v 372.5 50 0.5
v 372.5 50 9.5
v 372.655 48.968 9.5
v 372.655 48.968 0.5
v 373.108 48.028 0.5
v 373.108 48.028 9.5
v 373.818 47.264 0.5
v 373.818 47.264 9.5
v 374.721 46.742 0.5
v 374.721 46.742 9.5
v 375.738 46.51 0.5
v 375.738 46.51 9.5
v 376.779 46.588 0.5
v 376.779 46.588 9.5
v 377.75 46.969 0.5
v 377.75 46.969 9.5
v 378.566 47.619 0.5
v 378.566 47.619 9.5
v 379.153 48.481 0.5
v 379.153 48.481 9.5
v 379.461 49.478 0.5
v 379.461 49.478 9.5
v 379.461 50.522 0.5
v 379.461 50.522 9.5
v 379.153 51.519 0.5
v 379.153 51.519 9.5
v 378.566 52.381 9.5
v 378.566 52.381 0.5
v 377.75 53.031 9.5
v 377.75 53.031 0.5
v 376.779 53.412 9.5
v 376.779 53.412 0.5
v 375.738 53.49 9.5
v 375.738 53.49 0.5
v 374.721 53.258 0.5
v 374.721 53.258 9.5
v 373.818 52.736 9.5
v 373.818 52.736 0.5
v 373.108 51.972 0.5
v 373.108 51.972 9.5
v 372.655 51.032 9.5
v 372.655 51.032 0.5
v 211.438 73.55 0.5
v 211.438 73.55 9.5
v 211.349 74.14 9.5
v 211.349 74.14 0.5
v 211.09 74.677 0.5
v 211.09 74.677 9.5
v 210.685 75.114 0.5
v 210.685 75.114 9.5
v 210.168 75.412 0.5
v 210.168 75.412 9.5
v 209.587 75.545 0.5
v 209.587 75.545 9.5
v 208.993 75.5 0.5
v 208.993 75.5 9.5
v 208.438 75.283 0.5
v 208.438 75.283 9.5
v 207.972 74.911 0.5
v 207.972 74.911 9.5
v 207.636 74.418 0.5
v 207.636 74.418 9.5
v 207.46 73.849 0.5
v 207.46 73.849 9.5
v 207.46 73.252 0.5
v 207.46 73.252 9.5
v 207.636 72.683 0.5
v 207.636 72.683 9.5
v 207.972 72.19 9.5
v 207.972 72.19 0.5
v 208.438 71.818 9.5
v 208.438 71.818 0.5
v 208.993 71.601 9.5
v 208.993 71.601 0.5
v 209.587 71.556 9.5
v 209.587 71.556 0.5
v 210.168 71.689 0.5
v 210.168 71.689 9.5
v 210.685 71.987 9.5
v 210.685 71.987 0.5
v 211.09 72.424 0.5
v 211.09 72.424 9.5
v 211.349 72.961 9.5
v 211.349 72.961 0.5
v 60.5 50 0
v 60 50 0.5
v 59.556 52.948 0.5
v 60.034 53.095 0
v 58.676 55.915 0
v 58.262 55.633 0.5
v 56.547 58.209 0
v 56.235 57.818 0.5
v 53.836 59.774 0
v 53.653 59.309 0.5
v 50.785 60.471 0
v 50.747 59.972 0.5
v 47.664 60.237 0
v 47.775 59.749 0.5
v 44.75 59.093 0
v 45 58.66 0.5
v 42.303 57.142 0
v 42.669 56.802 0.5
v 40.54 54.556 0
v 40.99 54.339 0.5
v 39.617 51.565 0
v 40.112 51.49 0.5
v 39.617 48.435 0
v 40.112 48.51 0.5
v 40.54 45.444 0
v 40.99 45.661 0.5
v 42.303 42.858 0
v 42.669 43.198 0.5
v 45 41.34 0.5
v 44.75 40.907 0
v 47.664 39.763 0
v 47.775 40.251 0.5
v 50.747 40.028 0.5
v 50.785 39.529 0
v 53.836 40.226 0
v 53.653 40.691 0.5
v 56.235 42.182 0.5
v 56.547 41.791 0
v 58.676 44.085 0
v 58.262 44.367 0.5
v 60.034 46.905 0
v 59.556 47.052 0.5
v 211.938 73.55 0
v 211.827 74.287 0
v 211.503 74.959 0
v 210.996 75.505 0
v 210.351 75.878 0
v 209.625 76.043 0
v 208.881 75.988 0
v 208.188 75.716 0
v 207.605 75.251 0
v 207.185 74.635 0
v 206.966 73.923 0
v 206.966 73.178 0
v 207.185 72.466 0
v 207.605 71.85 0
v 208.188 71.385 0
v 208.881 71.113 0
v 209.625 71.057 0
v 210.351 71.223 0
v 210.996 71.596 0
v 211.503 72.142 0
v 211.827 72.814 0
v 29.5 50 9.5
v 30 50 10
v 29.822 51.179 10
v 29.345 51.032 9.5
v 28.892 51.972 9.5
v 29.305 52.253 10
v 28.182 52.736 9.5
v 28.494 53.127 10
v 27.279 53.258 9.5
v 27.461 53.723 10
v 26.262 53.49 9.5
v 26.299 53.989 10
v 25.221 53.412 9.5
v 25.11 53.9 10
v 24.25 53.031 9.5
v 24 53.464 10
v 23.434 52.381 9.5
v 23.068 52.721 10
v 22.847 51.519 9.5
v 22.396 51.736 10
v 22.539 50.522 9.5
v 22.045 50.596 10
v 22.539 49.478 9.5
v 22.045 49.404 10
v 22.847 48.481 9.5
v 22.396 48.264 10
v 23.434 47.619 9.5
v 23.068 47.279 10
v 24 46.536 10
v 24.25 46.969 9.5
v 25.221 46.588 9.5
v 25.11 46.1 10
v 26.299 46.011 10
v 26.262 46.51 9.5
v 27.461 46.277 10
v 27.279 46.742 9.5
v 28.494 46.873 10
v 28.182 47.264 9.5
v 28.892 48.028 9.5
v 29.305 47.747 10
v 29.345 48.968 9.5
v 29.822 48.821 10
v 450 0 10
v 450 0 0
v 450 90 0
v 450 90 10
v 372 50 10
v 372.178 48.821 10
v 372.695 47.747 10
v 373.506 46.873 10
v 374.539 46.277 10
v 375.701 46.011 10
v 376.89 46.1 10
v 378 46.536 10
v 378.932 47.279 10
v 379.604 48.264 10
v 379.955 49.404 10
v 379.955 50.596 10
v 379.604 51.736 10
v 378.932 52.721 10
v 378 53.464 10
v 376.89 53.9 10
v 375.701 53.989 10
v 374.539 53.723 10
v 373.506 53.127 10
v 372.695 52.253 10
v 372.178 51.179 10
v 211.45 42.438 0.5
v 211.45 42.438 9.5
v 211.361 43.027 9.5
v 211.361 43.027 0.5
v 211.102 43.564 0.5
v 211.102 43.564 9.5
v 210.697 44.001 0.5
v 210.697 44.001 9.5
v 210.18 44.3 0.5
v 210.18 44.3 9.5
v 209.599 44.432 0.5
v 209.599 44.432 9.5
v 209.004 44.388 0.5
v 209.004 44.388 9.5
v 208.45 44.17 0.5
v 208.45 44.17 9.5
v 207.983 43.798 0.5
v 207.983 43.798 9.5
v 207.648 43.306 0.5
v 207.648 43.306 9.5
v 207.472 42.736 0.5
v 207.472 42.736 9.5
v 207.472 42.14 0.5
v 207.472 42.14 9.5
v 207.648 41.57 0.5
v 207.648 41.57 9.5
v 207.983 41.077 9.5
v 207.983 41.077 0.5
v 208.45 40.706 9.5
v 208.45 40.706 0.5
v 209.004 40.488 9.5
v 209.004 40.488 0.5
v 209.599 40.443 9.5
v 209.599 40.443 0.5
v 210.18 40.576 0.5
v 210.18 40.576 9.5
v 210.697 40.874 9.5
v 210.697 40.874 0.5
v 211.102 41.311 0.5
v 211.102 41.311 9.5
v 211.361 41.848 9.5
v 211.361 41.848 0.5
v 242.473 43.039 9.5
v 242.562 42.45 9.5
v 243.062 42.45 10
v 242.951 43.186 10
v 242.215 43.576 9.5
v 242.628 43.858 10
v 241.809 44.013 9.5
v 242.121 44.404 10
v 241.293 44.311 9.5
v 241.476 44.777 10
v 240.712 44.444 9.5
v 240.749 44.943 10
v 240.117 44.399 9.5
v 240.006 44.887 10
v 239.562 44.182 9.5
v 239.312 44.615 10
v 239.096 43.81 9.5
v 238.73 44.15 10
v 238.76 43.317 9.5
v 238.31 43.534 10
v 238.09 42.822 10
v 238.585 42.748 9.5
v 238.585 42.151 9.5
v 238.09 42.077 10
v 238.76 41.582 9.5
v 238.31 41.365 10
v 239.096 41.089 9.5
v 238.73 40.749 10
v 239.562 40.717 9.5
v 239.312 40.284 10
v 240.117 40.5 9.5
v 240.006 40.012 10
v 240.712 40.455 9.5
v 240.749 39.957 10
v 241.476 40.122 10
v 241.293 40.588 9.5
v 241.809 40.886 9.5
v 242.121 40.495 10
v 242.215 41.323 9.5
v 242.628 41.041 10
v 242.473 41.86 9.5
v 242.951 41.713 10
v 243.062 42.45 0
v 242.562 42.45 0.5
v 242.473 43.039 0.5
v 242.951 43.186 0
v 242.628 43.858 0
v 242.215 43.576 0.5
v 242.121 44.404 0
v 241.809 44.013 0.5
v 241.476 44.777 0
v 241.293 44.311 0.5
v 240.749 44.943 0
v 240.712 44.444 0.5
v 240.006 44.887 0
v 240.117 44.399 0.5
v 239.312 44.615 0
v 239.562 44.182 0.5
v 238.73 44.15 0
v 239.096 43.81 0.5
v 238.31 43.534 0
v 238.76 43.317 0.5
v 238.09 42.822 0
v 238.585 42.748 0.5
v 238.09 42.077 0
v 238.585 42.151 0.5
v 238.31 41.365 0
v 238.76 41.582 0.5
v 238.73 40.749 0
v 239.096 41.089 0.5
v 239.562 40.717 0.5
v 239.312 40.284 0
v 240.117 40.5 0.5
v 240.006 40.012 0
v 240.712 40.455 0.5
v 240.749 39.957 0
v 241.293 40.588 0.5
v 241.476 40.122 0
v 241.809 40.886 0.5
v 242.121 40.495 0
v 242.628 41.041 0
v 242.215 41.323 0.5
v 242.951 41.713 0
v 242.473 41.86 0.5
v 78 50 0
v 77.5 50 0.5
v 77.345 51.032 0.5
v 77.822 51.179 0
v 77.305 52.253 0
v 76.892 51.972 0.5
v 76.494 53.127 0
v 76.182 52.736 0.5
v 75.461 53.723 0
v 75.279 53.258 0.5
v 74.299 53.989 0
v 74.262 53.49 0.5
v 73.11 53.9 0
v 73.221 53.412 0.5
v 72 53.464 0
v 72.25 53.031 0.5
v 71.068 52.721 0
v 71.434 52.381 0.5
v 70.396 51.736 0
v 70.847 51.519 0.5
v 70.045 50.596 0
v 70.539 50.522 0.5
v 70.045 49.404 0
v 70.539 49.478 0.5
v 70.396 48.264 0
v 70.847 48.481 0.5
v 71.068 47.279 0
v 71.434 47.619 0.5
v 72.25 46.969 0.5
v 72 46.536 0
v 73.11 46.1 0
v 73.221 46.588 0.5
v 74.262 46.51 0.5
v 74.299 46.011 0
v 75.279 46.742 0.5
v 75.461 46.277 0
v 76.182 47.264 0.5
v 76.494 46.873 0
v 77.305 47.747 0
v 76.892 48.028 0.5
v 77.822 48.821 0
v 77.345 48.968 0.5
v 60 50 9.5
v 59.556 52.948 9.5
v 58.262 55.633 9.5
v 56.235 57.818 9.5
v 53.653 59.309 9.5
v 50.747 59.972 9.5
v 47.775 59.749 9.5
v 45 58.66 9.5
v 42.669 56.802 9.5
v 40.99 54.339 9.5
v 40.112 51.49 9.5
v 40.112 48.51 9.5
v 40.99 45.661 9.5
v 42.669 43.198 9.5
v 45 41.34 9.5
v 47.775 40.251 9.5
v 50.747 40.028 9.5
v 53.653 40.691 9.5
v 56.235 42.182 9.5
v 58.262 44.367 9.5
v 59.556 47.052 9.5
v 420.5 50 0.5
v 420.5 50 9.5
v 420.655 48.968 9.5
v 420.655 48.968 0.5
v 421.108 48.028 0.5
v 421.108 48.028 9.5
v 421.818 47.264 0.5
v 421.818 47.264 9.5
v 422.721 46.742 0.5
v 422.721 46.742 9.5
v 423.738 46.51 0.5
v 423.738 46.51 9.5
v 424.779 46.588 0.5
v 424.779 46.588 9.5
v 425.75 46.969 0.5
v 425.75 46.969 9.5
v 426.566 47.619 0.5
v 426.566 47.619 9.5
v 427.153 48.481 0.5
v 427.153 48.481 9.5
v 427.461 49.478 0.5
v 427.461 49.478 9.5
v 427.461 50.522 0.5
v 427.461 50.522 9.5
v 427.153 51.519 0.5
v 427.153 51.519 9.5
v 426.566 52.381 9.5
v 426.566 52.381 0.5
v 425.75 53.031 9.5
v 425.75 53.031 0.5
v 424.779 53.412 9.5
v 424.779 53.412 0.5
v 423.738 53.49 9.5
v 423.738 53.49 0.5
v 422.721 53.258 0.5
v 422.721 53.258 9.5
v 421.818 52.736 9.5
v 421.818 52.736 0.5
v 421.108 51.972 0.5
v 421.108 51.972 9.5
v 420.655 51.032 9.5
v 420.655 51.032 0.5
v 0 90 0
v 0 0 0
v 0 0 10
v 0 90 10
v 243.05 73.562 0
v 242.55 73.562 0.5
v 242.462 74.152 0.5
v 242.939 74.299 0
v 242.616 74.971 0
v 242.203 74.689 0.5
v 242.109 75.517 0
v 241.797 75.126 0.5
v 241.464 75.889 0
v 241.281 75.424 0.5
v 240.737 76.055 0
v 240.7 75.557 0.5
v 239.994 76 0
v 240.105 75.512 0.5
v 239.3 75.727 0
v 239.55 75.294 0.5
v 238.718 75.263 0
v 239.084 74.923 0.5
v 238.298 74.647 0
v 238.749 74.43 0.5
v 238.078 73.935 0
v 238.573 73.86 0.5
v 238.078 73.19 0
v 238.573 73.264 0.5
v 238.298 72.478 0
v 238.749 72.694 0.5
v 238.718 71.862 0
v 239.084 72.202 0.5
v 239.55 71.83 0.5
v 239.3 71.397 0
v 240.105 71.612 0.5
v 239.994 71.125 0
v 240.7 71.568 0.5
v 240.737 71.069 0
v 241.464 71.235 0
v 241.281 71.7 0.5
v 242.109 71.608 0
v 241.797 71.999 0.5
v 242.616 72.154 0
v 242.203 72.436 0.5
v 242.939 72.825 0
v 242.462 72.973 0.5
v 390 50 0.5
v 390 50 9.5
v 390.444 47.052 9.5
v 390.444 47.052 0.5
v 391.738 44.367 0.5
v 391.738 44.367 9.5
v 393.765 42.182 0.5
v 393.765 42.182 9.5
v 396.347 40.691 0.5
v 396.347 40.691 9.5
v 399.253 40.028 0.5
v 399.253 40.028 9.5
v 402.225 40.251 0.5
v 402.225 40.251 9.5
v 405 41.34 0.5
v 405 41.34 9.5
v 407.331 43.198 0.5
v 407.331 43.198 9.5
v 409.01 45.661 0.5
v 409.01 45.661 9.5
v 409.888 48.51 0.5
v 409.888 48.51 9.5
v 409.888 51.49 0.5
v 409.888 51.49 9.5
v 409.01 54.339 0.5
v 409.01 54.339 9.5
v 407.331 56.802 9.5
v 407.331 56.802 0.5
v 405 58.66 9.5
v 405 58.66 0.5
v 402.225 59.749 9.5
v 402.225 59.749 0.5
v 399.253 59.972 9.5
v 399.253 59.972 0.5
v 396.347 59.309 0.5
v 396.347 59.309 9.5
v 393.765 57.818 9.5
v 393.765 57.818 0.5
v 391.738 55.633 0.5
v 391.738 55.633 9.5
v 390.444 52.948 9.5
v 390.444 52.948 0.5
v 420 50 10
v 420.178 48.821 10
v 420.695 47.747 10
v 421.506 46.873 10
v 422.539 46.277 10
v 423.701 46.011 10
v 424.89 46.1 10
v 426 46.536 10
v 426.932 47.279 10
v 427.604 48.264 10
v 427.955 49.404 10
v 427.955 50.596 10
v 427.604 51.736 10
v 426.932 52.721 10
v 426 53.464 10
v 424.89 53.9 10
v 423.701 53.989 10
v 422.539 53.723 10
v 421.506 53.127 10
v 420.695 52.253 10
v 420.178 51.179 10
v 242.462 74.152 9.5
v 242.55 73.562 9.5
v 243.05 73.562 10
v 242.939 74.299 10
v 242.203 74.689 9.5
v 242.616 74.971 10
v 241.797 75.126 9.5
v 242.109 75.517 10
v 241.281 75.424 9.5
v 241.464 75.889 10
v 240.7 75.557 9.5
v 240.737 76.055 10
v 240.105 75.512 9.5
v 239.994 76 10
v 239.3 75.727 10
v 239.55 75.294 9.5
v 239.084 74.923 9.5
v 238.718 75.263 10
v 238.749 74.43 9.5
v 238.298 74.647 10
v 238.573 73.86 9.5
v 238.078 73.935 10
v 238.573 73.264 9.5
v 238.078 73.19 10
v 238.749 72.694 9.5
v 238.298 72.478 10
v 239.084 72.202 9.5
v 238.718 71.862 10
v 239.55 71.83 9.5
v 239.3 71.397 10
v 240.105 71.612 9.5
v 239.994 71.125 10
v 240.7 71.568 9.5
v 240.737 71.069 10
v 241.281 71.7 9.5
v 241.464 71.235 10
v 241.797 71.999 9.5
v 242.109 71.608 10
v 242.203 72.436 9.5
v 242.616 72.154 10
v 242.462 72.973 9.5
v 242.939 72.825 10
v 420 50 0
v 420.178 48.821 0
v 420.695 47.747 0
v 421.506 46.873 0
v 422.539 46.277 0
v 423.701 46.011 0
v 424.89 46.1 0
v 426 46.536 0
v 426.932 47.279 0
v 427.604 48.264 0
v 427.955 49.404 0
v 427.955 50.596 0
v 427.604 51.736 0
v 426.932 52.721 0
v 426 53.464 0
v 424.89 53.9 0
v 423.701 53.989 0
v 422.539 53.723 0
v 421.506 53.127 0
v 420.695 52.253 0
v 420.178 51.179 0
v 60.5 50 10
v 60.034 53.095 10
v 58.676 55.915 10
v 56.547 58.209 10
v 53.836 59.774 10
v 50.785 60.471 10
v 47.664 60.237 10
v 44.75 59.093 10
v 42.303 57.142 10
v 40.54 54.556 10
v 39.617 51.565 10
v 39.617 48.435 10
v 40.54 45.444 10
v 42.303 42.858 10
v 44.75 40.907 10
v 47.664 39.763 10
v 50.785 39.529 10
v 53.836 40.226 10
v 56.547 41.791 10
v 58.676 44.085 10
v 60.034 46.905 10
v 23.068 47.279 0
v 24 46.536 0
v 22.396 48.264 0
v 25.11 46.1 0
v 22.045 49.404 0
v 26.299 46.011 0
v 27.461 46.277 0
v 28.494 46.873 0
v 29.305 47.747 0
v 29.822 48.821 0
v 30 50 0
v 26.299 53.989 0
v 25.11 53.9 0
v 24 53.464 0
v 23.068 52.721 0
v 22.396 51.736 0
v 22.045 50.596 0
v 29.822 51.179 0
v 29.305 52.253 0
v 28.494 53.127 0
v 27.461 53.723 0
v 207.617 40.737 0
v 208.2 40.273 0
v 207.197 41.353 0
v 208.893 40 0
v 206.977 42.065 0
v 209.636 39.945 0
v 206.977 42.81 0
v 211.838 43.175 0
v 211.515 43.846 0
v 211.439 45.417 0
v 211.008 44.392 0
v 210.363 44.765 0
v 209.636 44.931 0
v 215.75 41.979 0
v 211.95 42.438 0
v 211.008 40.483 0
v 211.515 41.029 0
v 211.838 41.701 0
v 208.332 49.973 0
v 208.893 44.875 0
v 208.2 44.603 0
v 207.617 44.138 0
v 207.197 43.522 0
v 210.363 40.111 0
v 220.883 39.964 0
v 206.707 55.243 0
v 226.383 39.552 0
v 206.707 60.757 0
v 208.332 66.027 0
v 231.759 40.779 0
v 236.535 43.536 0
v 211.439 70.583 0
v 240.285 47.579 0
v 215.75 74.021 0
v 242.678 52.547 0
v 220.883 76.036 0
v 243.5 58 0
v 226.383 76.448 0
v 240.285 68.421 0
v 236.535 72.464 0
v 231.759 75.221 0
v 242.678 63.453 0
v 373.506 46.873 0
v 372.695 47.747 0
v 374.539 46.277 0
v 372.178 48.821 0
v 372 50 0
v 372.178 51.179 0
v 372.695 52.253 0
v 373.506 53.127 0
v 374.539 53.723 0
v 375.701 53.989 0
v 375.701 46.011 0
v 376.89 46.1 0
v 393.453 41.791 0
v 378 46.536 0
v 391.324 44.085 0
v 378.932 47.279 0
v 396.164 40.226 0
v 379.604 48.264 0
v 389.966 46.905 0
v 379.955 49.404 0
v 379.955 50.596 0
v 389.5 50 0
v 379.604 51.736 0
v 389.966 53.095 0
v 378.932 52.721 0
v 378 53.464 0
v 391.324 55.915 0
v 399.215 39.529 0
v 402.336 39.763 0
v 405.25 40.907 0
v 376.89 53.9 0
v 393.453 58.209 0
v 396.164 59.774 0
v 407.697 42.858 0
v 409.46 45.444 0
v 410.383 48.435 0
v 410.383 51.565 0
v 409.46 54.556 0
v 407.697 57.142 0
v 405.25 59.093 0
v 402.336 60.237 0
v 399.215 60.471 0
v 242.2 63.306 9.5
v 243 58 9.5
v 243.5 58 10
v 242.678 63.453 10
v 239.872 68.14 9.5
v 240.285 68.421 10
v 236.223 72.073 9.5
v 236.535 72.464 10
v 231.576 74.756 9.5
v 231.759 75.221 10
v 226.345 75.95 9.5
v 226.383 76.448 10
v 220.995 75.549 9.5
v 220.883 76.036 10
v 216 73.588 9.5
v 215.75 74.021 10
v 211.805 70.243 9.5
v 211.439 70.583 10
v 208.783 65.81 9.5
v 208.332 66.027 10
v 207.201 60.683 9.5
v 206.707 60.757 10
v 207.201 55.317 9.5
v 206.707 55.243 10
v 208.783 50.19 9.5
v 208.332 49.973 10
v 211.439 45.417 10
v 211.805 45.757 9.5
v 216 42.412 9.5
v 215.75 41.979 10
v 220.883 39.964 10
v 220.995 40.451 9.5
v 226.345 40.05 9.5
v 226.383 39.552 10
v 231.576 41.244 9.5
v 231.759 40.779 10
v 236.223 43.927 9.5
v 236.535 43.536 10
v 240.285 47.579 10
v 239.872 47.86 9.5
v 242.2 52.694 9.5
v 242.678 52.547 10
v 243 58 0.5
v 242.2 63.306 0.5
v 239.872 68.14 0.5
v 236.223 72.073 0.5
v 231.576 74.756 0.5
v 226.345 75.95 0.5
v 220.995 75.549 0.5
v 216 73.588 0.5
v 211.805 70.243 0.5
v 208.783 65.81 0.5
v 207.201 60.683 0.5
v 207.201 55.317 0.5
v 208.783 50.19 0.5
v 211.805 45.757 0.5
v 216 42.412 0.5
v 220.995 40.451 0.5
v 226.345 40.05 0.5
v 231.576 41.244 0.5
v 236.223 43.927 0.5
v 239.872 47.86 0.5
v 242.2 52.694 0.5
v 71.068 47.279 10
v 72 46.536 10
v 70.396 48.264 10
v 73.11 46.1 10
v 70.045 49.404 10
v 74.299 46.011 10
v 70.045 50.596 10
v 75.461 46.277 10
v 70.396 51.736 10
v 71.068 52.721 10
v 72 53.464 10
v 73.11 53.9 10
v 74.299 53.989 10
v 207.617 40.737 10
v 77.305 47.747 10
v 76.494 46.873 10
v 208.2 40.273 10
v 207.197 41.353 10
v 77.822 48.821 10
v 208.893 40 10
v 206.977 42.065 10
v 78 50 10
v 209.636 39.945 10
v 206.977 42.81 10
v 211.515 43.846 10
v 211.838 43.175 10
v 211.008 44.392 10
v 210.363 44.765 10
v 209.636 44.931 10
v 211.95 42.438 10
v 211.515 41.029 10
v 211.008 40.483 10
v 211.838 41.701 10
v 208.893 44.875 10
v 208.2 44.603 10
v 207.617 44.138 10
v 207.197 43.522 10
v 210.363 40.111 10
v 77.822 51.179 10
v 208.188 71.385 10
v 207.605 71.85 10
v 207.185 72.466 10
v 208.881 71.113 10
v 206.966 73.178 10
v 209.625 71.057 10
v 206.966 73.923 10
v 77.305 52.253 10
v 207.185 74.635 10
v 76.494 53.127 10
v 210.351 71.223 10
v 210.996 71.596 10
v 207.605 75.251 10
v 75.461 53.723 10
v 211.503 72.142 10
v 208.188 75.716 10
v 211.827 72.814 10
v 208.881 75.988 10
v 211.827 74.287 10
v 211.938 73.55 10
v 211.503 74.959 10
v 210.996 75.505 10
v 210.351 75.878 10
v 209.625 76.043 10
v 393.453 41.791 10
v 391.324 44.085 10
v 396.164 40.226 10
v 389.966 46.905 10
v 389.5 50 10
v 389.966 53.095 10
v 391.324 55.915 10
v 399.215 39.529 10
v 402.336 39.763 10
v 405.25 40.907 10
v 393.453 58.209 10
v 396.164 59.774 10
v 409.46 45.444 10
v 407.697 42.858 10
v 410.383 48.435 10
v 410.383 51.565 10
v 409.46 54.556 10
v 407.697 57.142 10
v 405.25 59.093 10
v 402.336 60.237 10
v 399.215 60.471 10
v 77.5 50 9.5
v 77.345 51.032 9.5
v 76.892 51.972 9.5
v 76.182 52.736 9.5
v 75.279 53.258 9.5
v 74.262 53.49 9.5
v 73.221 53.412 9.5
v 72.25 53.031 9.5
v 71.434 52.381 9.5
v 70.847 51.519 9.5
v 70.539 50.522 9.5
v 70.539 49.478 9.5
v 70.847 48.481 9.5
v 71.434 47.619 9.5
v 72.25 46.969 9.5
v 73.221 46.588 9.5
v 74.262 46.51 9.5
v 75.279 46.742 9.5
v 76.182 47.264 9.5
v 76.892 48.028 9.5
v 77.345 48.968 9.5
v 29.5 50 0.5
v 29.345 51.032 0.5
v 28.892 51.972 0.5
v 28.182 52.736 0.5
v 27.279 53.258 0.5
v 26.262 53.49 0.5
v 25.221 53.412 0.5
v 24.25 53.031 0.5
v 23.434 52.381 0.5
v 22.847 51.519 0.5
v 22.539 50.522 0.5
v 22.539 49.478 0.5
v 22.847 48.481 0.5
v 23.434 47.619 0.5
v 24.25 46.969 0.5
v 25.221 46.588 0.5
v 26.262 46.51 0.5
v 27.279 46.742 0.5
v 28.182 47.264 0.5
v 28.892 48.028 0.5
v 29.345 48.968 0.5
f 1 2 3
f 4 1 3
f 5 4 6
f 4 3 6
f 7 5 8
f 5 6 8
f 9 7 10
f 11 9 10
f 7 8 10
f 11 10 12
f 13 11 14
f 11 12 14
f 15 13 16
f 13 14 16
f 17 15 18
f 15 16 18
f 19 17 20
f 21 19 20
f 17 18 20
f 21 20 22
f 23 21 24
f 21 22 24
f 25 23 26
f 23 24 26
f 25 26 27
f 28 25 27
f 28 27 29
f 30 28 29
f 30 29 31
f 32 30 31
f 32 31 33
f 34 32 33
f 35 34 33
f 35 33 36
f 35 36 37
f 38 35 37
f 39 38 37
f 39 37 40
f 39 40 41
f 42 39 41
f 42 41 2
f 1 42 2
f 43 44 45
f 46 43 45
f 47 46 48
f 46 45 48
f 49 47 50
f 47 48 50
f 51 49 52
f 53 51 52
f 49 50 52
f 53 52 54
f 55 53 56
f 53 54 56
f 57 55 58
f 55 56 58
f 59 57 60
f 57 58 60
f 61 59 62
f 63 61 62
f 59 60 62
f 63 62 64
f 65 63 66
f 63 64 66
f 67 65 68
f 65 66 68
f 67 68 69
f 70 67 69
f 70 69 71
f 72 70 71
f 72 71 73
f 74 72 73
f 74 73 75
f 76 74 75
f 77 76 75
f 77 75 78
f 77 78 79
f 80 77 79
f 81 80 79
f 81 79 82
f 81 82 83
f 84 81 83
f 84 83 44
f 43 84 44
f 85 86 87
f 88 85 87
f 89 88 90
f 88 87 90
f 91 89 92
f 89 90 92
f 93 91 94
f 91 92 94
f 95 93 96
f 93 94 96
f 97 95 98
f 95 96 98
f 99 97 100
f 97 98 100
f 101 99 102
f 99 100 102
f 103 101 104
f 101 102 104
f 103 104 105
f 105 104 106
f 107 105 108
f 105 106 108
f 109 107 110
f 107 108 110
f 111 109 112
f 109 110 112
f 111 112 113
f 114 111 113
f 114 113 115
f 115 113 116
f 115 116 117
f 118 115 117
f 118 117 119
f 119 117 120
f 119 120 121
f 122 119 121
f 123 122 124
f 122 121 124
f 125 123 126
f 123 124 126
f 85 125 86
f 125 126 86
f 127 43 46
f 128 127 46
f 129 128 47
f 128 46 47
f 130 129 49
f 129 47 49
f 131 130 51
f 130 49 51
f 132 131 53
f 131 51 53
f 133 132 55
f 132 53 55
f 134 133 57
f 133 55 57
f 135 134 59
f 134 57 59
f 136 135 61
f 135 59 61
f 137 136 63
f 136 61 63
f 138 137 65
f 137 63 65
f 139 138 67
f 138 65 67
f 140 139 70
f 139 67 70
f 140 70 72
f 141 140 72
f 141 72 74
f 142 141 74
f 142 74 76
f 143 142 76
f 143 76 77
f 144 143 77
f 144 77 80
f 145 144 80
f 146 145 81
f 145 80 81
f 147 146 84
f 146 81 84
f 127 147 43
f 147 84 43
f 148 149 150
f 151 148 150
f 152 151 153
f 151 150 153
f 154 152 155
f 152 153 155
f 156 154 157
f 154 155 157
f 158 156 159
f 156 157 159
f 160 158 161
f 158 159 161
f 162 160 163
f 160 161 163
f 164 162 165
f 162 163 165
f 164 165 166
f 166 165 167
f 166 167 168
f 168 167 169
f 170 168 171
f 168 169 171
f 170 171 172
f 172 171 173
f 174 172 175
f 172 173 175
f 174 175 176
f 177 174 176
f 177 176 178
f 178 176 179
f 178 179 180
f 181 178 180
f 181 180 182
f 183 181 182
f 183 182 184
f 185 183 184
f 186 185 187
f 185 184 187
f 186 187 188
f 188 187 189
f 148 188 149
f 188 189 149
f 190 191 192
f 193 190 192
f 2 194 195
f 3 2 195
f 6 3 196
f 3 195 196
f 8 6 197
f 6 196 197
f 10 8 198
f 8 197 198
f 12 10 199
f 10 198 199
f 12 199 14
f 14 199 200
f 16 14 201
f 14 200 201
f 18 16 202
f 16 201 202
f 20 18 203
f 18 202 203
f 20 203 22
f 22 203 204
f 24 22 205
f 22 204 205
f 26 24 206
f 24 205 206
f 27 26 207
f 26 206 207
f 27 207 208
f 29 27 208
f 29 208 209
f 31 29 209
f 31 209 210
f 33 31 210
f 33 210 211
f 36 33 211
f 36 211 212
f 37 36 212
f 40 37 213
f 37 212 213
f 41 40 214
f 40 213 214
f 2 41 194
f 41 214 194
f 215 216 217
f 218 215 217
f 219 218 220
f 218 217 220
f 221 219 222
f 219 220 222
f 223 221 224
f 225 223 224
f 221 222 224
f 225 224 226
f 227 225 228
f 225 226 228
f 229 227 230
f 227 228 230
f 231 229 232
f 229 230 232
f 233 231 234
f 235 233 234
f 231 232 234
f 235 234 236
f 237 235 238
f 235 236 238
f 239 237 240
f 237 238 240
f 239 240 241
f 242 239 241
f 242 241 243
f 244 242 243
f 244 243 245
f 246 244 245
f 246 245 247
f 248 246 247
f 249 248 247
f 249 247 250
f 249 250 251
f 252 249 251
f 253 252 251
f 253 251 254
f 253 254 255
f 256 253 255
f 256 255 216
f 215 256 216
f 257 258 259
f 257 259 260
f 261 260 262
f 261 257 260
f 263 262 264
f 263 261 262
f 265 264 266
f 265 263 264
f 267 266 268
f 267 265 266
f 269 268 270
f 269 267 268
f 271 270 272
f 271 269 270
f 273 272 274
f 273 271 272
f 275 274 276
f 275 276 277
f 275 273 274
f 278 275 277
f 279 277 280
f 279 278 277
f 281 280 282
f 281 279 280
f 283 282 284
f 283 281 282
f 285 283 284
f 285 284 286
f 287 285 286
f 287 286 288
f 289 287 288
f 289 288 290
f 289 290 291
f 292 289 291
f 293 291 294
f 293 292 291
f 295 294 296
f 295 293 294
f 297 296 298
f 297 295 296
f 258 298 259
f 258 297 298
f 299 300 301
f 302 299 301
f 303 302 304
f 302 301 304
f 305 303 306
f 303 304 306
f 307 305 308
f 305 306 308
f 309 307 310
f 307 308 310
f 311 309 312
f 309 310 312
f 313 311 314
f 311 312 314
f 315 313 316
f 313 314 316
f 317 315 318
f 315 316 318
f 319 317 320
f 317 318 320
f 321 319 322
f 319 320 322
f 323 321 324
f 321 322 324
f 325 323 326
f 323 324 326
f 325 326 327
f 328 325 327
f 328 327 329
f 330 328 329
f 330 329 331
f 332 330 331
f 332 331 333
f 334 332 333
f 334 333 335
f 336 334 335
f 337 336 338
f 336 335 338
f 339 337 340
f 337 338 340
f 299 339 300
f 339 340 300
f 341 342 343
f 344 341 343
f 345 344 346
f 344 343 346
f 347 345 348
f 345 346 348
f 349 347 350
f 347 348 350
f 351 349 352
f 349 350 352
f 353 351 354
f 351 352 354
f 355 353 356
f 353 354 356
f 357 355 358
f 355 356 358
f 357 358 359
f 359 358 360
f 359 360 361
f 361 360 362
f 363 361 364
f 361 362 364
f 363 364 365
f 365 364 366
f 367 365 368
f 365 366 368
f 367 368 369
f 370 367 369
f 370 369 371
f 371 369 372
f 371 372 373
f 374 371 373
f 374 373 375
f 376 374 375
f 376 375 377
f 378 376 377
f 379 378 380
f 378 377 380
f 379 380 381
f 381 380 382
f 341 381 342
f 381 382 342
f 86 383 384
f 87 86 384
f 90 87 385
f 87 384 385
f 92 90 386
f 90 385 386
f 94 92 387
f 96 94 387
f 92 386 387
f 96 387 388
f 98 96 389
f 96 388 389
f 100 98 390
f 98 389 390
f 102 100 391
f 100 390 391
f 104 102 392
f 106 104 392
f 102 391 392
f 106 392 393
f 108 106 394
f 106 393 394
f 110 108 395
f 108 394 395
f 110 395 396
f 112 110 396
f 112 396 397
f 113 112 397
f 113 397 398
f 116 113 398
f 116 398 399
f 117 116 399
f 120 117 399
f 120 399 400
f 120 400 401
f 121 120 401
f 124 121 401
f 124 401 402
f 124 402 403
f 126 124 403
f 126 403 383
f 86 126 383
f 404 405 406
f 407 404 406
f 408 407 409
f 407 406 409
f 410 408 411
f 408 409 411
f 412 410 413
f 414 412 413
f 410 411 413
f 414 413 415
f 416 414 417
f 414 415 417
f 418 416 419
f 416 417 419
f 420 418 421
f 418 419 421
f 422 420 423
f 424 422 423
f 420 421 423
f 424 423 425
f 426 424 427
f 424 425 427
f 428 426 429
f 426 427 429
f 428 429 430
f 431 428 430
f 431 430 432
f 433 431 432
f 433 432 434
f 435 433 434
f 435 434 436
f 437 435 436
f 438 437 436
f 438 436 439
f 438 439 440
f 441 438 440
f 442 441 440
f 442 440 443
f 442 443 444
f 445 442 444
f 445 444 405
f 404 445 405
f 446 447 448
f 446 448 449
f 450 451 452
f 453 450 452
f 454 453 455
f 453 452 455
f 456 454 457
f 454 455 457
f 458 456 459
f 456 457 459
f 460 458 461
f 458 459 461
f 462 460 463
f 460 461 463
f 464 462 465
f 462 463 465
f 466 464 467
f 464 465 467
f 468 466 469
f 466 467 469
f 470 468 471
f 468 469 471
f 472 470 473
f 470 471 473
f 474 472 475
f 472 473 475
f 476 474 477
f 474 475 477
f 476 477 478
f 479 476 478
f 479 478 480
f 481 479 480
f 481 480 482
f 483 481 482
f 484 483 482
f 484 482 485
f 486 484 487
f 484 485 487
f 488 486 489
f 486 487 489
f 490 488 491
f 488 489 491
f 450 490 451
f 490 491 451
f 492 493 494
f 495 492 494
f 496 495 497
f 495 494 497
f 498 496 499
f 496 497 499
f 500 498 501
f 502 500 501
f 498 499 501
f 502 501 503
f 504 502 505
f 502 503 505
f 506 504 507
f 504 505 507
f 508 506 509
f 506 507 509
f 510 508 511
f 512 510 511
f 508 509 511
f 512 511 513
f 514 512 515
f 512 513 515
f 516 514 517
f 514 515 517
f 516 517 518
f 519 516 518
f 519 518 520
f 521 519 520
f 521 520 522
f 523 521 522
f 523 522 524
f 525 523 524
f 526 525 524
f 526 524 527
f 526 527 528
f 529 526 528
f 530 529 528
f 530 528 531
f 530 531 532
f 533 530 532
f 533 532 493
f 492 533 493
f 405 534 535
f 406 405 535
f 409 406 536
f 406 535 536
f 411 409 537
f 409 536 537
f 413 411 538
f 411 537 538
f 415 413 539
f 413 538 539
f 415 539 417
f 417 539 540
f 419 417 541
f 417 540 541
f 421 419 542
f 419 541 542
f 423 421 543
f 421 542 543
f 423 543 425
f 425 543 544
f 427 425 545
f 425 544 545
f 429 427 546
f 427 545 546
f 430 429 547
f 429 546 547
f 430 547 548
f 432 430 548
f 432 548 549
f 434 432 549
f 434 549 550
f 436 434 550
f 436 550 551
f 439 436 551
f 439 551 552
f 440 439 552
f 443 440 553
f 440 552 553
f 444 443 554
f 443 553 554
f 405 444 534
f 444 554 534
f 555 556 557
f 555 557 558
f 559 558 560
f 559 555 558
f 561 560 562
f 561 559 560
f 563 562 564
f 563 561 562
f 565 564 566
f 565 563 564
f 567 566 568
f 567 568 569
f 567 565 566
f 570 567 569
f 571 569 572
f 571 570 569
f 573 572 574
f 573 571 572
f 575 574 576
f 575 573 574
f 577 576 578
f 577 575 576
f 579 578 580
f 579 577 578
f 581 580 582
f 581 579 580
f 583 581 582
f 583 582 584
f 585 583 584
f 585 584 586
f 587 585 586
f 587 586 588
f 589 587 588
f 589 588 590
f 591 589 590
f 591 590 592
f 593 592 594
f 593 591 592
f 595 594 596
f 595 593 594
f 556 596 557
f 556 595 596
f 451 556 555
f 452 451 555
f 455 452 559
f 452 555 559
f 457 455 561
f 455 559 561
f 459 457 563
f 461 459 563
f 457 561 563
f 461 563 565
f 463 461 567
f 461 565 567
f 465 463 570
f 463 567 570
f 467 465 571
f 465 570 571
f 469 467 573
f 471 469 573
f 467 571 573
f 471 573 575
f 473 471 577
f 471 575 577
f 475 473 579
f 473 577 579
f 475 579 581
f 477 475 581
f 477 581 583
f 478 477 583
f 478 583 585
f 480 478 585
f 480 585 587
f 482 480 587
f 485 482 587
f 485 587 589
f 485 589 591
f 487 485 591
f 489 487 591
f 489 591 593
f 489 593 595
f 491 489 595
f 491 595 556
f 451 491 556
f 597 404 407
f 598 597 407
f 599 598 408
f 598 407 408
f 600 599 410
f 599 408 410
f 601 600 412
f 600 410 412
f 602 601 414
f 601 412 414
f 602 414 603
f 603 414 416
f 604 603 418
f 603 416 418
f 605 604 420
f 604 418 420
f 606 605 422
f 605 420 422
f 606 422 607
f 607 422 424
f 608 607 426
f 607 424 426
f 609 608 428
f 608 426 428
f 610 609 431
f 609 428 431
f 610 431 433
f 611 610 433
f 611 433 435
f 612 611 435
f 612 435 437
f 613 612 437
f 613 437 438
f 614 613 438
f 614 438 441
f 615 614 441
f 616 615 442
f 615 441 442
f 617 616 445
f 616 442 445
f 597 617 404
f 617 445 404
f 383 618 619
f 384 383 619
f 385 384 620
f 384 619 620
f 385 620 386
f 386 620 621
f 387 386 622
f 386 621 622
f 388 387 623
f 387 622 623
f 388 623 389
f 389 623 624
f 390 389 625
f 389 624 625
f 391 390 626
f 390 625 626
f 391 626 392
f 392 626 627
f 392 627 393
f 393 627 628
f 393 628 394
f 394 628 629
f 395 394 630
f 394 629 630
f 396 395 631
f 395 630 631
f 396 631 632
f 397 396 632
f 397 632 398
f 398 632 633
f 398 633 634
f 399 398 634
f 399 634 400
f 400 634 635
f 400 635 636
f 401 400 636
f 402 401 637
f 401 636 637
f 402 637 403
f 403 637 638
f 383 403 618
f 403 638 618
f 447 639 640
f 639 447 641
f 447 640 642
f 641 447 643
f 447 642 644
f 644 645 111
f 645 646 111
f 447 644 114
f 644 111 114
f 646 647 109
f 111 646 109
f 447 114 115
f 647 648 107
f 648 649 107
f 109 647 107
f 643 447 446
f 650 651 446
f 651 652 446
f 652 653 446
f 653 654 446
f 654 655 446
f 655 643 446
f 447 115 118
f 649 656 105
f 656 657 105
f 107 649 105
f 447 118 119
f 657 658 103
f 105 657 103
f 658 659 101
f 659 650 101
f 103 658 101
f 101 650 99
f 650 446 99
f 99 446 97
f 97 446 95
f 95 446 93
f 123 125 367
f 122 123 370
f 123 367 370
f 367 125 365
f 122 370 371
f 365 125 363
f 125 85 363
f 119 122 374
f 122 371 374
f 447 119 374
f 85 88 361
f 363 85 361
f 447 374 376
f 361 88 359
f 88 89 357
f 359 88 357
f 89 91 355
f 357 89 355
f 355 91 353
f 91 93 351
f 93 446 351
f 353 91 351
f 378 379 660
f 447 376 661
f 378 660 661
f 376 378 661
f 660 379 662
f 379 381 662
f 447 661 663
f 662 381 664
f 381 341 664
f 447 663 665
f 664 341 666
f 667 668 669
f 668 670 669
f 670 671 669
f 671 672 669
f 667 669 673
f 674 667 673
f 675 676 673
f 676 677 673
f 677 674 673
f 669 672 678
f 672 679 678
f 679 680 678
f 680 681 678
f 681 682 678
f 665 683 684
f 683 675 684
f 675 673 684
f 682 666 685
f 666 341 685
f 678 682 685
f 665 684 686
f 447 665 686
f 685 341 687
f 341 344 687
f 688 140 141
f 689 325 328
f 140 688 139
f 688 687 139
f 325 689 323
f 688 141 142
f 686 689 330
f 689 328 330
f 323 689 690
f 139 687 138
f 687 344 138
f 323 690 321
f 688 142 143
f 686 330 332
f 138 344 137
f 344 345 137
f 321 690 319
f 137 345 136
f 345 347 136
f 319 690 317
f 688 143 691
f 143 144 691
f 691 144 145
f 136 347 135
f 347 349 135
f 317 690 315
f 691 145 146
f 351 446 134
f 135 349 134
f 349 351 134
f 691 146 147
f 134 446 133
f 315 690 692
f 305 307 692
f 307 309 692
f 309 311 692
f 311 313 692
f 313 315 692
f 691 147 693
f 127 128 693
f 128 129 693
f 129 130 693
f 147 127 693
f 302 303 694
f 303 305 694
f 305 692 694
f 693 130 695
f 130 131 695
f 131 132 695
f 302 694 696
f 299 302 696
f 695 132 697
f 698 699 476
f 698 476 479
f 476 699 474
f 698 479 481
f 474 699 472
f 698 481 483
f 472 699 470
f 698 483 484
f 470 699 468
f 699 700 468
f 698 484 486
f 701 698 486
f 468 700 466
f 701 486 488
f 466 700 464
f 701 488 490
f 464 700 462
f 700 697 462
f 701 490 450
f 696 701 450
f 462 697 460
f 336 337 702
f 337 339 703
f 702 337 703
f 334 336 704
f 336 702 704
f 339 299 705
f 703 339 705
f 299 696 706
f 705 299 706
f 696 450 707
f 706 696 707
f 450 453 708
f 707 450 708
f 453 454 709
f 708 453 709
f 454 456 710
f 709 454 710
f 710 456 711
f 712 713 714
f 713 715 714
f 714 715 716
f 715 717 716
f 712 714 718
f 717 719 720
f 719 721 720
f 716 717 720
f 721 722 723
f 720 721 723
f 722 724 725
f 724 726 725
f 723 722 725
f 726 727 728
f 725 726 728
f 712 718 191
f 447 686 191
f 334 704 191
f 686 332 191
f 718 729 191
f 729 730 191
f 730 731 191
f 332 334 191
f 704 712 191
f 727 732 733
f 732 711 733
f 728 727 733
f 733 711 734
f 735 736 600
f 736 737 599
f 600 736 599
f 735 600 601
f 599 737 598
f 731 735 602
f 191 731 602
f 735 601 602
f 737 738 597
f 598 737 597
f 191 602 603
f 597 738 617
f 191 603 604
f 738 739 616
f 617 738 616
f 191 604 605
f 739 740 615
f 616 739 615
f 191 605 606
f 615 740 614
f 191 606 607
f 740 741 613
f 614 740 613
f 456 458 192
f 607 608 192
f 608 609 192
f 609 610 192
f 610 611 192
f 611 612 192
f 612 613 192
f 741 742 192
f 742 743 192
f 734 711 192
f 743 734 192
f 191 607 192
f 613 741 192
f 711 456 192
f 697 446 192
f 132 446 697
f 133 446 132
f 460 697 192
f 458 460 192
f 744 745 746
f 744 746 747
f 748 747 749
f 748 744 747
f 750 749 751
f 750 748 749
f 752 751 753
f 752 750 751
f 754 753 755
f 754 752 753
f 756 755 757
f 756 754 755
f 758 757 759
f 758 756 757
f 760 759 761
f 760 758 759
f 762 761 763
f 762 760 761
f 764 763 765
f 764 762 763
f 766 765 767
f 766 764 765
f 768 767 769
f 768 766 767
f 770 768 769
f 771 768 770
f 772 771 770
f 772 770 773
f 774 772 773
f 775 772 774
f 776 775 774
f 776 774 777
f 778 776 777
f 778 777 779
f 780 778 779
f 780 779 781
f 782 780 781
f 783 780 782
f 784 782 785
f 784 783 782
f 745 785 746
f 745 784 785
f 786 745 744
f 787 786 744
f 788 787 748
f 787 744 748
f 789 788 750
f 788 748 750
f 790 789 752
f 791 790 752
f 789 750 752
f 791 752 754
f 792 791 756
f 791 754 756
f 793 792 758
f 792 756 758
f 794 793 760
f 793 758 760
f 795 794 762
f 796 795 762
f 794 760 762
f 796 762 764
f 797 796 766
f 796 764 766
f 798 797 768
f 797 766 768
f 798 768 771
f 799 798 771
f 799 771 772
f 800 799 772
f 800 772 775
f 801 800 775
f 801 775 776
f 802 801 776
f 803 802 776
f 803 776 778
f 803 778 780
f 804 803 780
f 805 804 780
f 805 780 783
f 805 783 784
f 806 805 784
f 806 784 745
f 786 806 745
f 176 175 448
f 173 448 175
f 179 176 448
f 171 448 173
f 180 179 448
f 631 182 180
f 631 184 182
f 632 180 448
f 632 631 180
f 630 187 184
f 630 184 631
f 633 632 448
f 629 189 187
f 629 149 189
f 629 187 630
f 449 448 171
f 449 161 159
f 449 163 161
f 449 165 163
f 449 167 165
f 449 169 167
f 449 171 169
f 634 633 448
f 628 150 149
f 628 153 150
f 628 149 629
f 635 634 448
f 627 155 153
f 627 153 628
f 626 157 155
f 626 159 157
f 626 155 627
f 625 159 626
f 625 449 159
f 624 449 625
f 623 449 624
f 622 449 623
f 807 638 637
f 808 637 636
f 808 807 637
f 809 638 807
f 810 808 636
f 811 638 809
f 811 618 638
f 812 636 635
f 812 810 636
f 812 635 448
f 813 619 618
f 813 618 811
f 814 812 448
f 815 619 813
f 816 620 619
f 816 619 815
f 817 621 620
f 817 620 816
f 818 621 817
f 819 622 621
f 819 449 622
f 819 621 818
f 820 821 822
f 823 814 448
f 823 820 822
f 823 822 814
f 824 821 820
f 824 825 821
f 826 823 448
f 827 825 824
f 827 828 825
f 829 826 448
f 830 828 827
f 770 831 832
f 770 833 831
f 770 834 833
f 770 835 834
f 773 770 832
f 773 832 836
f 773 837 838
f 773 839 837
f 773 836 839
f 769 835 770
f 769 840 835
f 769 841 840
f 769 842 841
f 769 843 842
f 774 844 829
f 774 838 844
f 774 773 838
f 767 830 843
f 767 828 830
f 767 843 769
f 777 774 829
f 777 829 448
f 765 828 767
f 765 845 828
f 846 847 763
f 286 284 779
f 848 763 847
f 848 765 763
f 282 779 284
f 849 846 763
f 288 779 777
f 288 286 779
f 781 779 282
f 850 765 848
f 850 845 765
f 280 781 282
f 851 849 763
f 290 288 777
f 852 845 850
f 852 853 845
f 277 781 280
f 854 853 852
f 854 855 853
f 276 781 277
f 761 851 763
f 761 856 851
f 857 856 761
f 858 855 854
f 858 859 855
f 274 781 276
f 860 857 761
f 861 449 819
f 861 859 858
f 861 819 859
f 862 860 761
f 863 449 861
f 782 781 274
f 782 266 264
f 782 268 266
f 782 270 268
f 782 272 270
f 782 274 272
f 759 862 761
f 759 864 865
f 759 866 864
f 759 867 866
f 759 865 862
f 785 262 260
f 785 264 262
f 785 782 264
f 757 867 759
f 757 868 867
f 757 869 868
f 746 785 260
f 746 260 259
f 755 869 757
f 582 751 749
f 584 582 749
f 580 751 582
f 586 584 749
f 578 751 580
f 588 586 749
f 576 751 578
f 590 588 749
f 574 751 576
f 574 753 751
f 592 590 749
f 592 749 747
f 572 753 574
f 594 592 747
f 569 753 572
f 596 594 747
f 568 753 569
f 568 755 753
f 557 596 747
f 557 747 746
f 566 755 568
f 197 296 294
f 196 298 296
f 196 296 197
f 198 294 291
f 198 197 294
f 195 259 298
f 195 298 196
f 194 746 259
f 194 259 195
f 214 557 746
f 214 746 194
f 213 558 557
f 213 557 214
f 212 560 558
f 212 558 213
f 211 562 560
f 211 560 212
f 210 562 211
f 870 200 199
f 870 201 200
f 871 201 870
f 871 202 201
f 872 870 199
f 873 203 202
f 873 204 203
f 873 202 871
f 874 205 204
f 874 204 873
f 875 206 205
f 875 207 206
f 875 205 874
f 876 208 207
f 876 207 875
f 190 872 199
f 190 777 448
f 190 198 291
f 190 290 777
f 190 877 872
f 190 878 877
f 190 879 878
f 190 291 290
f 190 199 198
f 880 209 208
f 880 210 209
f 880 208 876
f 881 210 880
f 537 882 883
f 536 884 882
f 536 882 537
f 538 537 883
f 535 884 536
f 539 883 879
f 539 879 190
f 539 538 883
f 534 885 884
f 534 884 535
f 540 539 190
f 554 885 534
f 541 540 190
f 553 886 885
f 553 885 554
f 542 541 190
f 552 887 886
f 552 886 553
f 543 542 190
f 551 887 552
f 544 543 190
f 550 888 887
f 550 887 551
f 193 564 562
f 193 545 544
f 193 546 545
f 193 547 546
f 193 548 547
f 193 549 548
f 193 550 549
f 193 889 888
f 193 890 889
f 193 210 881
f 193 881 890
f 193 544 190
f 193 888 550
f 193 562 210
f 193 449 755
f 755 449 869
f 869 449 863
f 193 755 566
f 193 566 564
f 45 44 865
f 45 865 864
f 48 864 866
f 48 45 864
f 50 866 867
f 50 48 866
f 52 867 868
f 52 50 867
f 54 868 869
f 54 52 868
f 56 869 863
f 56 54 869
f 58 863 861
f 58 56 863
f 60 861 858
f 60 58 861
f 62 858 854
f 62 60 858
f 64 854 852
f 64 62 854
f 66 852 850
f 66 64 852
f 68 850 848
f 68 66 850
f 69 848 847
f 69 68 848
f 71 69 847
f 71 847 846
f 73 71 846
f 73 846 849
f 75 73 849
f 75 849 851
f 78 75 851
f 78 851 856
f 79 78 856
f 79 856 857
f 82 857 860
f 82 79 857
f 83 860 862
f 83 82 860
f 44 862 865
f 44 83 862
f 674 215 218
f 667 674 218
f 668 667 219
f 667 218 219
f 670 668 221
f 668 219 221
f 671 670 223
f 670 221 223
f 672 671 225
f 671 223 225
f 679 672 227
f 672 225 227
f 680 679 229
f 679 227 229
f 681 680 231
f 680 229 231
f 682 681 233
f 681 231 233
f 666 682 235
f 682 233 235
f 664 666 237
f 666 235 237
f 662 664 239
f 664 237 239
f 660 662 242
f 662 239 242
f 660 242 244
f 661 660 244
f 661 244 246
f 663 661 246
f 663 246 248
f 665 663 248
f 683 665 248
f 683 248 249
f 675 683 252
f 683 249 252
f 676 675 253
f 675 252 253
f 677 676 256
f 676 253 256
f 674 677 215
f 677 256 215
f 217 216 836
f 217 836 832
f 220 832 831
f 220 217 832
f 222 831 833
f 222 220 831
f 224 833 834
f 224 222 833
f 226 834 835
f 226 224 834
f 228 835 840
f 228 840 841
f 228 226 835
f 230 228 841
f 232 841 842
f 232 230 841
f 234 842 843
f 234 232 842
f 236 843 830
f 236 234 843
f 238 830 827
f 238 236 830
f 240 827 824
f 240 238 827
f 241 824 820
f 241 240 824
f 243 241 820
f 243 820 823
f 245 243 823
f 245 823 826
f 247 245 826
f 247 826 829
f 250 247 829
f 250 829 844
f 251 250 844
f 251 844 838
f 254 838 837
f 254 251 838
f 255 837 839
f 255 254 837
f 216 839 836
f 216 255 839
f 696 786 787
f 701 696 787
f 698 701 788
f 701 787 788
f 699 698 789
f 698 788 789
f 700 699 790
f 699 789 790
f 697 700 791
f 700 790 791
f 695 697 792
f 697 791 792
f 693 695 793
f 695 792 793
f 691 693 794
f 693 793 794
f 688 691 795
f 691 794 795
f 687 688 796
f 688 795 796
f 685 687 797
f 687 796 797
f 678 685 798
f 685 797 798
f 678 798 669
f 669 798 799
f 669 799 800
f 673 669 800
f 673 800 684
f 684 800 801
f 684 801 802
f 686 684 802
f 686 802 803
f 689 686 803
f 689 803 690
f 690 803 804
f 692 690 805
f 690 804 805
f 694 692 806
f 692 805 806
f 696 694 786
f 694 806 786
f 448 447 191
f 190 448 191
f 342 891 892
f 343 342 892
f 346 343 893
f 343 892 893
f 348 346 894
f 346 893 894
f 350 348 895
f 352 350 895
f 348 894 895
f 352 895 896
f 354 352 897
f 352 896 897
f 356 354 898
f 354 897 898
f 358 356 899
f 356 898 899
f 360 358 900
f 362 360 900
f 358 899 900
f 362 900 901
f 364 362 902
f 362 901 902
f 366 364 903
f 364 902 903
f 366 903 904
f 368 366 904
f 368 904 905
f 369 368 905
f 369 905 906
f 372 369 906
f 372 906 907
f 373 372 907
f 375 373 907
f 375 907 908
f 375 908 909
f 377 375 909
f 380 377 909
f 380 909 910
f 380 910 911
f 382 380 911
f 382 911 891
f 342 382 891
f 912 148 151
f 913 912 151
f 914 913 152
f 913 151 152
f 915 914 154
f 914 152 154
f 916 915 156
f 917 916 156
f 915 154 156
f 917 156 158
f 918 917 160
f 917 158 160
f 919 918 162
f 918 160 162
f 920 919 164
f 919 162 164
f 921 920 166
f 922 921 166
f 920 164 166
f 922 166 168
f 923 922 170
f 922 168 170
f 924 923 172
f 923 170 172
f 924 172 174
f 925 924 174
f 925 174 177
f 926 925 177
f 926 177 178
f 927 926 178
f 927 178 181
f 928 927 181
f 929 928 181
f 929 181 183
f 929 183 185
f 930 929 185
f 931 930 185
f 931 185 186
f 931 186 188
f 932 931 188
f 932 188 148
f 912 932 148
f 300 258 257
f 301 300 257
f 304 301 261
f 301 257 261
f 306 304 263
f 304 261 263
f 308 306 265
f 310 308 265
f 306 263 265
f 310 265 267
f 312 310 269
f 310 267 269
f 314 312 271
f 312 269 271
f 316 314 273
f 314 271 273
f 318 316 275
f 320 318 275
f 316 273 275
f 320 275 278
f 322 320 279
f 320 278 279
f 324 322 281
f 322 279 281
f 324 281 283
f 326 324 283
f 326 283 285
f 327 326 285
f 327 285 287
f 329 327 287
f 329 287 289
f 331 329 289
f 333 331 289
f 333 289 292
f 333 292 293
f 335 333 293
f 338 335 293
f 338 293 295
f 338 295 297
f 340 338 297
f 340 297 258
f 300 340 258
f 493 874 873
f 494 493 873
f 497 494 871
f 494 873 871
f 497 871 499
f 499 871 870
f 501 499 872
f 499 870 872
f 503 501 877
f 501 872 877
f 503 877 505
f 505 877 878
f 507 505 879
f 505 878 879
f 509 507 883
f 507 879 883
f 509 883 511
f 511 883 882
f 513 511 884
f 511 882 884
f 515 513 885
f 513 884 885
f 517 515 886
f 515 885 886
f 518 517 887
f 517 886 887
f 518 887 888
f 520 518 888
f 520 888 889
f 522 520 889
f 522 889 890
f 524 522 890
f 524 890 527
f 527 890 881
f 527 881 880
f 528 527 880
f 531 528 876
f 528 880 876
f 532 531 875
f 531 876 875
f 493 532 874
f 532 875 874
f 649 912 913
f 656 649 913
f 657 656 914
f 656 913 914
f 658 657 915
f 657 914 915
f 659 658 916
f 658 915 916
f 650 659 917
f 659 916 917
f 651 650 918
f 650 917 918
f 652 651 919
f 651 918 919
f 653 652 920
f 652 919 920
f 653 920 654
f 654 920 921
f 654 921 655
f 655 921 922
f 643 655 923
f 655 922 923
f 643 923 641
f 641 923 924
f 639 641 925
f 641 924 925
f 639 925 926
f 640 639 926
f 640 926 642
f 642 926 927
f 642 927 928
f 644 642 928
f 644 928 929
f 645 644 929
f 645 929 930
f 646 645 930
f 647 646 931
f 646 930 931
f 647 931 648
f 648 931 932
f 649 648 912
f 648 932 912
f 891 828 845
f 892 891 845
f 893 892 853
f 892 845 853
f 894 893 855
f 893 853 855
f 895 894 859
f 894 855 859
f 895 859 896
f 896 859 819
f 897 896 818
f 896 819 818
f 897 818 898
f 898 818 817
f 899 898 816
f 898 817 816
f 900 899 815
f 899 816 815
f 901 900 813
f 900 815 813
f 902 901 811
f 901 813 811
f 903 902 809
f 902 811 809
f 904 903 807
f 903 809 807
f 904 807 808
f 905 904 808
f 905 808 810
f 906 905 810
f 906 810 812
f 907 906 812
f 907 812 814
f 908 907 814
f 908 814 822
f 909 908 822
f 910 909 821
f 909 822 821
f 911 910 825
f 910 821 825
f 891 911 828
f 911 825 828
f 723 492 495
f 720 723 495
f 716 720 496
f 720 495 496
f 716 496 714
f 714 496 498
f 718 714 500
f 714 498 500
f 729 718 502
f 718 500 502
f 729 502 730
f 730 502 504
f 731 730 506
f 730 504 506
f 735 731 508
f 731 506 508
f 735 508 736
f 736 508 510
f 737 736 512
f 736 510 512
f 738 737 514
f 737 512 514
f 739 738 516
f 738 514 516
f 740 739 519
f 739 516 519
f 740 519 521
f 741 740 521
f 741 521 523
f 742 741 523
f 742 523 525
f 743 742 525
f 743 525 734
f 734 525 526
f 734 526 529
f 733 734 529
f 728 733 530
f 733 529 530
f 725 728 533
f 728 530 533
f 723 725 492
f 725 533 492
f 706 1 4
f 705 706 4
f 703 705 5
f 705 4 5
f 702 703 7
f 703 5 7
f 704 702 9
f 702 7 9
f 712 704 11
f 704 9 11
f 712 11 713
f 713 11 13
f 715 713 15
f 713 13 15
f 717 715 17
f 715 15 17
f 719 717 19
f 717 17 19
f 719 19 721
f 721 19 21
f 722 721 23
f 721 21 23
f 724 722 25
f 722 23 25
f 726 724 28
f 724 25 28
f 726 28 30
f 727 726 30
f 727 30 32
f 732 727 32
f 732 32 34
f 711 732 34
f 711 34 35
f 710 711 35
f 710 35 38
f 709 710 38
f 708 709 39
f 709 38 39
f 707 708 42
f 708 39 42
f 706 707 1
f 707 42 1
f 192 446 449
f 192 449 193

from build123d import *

# Parameters (mm, degrees)
CROQUIS2_W              = 450
CROQUIS2_H              = 90
SALIENTE_EXTRUIR1_DEPTH = 10
CROQUIS6_R              = 18
CROQUIS6_R_2            = 2
CORTAR_EXTRUIR1_DEPTH   = 460.020696701
CHAFL_N5_SIZE           = 0.5
CROQUIS9_R              = 10
CROQUIS9_R_2            = 3.5
CORTAR_EXTRUIR2_DEPTH   = 460.020696701
CHAFL_N6_SIZE           = 0.5


with BuildPart() as part:
    # Croquis2 → Saliente-Extruir1 (new body)
    with BuildSketch(Plane.XY):
        with Locations((225, 45)):
            Rectangle(CROQUIS2_W, CROQUIS2_H)
    extrude(amount=SALIENTE_EXTRUIR1_DEPTH)

    # Croquis6 → Cortar-Extruir1 (cut, through all)
    with BuildSketch(Plane.XY.offset(10)):
        with Locations((225, 58)):
            Circle(CROQUIS6_R)
        with Locations((209.437767177, 73.550463323)):
            Circle(CROQUIS6_R_2)
        with Locations((240.550463323, 73.562232823)):
            Circle(CROQUIS6_R_2)
        with Locations((240.562232823, 42.449536677)):
            Circle(CROQUIS6_R_2)
        with Locations((209.449536677, 42.437767177)):
            Circle(CROQUIS6_R_2)
    extrude(amount=-CORTAR_EXTRUIR1_DEPTH, mode=Mode.SUBTRACT)

    # Chaflán5
    chafl_n5_edges = [part.edges().sort_by_distance(p)[0] for p in [
        (207, 58, 0),
        (207, 58, 10),
        (207.437767177, 73.550463323, 0),
        (207.437767177, 73.550463323, 10),
        (238.550463323, 73.562232823, 0),
        (238.550463323, 73.562232823, 10),
        (238.562232823, 42.449536677, 0),
        (238.562232823, 42.449536677, 10),
        (207.449536677, 42.437767177, 0),
        (207.449536677, 42.437767177, 10),
    ]]
    chamfer(chafl_n5_edges, length=CHAFL_N5_SIZE)

    # Croquis9 → Cortar-Extruir2 (cut, through all)
    with BuildSketch(Plane.XY.offset(10)):
        with Locations((50, 50)):
            Circle(CROQUIS9_R)
        with Locations(Location((400, 50, 0), (0, 0, 180))):
            Circle(CROQUIS9_R)
        with Locations((26, 50)):
            Circle(CROQUIS9_R_2)
        with Locations((74, 50)):
            Circle(CROQUIS9_R_2)
        with Locations(Location((376, 50, 0), (0, 0, 180))):
            Circle(CROQUIS9_R_2)
        with Locations(Location((424, 50, 0), (0, 0, 180))):
            Circle(CROQUIS9_R_2)
    extrude(amount=-CORTAR_EXTRUIR2_DEPTH, mode=Mode.SUBTRACT)

    # Chaflán6
    chafl_n6_edges = [part.edges().sort_by_distance(p)[0] for p in [
        (40, 50, 0),
        (40, 50, 10),
        (410, 50, 0),
        (410, 50, 10),
        (22.5, 50, 0),
        (22.5, 50, 10),
        (70.5, 50, 0),
        (70.5, 50, 10),
        (379.5, 50, 0),
        (379.5, 50, 10),
        (427.5, 50, 0),
        (427.5, 50, 10),
    ]]
    chamfer(chafl_n6_edges, length=CHAFL_N6_SIZE)


solid = part.part
